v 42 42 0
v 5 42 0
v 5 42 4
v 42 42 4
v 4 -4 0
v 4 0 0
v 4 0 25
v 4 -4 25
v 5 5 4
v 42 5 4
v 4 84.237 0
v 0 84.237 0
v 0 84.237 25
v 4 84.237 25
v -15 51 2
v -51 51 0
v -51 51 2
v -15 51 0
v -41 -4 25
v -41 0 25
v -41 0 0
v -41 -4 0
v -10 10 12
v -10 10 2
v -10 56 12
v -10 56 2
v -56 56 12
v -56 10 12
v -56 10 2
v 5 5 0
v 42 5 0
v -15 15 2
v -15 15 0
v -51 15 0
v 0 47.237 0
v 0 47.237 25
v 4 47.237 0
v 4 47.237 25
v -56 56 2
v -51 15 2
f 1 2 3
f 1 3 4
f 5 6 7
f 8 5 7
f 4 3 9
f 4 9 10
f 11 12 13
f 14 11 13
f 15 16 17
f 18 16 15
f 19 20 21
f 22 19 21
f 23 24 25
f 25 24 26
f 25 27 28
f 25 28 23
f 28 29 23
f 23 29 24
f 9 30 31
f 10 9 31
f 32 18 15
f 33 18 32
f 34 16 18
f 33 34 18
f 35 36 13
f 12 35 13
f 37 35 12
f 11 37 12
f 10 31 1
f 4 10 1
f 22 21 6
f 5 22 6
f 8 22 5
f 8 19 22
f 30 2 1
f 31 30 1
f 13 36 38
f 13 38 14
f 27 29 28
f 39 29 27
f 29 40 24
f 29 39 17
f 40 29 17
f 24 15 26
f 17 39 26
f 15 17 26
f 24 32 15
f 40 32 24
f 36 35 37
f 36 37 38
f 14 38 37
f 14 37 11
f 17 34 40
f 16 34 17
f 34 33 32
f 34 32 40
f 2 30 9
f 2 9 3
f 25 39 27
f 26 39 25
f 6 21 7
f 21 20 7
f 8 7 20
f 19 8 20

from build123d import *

# Parameters (mm, degrees)
F0_W      = 37
F0_H      = 37
F1_DEPTH  = 4
F3_DEPTH  = 4
F4_W      = 37
F4_H      = 25
F5_DEPTH  = 4
F6_W      = 46
F6_H      = 46
F7_DEPTH  = 12
F9_DEPTH  = 2
F11_DEPTH = 2


with BuildPart() as f1:
    # F0 (on Top) → F1 (new body)
    with BuildSketch(Plane.XY):
        with Locations((23.5, 23.5)):
            Rectangle(F0_W, F0_H)
    extrude(amount=F1_DEPTH)


with BuildPart() as f3:
    # F2 (on Front) → F3 (new body)
    with BuildSketch(Plane.XZ):
        Polygon((-41, 0), (0, 0), (4, 0), (4, 25), (-41, 25), align=None)
    extrude(amount=F3_DEPTH)


with BuildPart() as f5:
    # F4 (on Right) → F5 (new body)
    with BuildSketch(Plane.YZ):
        with Locations((65.736636, 12.5)):
            Rectangle(F4_W, F4_H)
    extrude(amount=F5_DEPTH)


with BuildPart() as f7:
    # F6 (on Top) → F7 (new body)
    with BuildSketch(Plane.XY):
        with Locations((-33, 33)):
            Rectangle(F6_W, F6_H)
    extrude(amount=F7_DEPTH)

    # F8 (on Top) → F9 (cut)
    with BuildSketch(Plane.XY):
        Polygon((-10, 10), (-10, 56), (-15, 56), (-15, 15), (-56, 15), (-56, 10), (-15, 10), align=None)
    extrude(amount=F9_DEPTH, mode=Mode.SUBTRACT)

    # F10 (on Top) → F11 (cut)
    with BuildSketch(Plane.XY):
        Polygon((-10, 51), (-10, 56), (-56, 56), (-56, 10), (-51, 10), (-51, 51), align=None)
    extrude(amount=F11_DEPTH, mode=Mode.SUBTRACT)


solid = Compound([f1.part, f3.part, f5.part, f7.part])
